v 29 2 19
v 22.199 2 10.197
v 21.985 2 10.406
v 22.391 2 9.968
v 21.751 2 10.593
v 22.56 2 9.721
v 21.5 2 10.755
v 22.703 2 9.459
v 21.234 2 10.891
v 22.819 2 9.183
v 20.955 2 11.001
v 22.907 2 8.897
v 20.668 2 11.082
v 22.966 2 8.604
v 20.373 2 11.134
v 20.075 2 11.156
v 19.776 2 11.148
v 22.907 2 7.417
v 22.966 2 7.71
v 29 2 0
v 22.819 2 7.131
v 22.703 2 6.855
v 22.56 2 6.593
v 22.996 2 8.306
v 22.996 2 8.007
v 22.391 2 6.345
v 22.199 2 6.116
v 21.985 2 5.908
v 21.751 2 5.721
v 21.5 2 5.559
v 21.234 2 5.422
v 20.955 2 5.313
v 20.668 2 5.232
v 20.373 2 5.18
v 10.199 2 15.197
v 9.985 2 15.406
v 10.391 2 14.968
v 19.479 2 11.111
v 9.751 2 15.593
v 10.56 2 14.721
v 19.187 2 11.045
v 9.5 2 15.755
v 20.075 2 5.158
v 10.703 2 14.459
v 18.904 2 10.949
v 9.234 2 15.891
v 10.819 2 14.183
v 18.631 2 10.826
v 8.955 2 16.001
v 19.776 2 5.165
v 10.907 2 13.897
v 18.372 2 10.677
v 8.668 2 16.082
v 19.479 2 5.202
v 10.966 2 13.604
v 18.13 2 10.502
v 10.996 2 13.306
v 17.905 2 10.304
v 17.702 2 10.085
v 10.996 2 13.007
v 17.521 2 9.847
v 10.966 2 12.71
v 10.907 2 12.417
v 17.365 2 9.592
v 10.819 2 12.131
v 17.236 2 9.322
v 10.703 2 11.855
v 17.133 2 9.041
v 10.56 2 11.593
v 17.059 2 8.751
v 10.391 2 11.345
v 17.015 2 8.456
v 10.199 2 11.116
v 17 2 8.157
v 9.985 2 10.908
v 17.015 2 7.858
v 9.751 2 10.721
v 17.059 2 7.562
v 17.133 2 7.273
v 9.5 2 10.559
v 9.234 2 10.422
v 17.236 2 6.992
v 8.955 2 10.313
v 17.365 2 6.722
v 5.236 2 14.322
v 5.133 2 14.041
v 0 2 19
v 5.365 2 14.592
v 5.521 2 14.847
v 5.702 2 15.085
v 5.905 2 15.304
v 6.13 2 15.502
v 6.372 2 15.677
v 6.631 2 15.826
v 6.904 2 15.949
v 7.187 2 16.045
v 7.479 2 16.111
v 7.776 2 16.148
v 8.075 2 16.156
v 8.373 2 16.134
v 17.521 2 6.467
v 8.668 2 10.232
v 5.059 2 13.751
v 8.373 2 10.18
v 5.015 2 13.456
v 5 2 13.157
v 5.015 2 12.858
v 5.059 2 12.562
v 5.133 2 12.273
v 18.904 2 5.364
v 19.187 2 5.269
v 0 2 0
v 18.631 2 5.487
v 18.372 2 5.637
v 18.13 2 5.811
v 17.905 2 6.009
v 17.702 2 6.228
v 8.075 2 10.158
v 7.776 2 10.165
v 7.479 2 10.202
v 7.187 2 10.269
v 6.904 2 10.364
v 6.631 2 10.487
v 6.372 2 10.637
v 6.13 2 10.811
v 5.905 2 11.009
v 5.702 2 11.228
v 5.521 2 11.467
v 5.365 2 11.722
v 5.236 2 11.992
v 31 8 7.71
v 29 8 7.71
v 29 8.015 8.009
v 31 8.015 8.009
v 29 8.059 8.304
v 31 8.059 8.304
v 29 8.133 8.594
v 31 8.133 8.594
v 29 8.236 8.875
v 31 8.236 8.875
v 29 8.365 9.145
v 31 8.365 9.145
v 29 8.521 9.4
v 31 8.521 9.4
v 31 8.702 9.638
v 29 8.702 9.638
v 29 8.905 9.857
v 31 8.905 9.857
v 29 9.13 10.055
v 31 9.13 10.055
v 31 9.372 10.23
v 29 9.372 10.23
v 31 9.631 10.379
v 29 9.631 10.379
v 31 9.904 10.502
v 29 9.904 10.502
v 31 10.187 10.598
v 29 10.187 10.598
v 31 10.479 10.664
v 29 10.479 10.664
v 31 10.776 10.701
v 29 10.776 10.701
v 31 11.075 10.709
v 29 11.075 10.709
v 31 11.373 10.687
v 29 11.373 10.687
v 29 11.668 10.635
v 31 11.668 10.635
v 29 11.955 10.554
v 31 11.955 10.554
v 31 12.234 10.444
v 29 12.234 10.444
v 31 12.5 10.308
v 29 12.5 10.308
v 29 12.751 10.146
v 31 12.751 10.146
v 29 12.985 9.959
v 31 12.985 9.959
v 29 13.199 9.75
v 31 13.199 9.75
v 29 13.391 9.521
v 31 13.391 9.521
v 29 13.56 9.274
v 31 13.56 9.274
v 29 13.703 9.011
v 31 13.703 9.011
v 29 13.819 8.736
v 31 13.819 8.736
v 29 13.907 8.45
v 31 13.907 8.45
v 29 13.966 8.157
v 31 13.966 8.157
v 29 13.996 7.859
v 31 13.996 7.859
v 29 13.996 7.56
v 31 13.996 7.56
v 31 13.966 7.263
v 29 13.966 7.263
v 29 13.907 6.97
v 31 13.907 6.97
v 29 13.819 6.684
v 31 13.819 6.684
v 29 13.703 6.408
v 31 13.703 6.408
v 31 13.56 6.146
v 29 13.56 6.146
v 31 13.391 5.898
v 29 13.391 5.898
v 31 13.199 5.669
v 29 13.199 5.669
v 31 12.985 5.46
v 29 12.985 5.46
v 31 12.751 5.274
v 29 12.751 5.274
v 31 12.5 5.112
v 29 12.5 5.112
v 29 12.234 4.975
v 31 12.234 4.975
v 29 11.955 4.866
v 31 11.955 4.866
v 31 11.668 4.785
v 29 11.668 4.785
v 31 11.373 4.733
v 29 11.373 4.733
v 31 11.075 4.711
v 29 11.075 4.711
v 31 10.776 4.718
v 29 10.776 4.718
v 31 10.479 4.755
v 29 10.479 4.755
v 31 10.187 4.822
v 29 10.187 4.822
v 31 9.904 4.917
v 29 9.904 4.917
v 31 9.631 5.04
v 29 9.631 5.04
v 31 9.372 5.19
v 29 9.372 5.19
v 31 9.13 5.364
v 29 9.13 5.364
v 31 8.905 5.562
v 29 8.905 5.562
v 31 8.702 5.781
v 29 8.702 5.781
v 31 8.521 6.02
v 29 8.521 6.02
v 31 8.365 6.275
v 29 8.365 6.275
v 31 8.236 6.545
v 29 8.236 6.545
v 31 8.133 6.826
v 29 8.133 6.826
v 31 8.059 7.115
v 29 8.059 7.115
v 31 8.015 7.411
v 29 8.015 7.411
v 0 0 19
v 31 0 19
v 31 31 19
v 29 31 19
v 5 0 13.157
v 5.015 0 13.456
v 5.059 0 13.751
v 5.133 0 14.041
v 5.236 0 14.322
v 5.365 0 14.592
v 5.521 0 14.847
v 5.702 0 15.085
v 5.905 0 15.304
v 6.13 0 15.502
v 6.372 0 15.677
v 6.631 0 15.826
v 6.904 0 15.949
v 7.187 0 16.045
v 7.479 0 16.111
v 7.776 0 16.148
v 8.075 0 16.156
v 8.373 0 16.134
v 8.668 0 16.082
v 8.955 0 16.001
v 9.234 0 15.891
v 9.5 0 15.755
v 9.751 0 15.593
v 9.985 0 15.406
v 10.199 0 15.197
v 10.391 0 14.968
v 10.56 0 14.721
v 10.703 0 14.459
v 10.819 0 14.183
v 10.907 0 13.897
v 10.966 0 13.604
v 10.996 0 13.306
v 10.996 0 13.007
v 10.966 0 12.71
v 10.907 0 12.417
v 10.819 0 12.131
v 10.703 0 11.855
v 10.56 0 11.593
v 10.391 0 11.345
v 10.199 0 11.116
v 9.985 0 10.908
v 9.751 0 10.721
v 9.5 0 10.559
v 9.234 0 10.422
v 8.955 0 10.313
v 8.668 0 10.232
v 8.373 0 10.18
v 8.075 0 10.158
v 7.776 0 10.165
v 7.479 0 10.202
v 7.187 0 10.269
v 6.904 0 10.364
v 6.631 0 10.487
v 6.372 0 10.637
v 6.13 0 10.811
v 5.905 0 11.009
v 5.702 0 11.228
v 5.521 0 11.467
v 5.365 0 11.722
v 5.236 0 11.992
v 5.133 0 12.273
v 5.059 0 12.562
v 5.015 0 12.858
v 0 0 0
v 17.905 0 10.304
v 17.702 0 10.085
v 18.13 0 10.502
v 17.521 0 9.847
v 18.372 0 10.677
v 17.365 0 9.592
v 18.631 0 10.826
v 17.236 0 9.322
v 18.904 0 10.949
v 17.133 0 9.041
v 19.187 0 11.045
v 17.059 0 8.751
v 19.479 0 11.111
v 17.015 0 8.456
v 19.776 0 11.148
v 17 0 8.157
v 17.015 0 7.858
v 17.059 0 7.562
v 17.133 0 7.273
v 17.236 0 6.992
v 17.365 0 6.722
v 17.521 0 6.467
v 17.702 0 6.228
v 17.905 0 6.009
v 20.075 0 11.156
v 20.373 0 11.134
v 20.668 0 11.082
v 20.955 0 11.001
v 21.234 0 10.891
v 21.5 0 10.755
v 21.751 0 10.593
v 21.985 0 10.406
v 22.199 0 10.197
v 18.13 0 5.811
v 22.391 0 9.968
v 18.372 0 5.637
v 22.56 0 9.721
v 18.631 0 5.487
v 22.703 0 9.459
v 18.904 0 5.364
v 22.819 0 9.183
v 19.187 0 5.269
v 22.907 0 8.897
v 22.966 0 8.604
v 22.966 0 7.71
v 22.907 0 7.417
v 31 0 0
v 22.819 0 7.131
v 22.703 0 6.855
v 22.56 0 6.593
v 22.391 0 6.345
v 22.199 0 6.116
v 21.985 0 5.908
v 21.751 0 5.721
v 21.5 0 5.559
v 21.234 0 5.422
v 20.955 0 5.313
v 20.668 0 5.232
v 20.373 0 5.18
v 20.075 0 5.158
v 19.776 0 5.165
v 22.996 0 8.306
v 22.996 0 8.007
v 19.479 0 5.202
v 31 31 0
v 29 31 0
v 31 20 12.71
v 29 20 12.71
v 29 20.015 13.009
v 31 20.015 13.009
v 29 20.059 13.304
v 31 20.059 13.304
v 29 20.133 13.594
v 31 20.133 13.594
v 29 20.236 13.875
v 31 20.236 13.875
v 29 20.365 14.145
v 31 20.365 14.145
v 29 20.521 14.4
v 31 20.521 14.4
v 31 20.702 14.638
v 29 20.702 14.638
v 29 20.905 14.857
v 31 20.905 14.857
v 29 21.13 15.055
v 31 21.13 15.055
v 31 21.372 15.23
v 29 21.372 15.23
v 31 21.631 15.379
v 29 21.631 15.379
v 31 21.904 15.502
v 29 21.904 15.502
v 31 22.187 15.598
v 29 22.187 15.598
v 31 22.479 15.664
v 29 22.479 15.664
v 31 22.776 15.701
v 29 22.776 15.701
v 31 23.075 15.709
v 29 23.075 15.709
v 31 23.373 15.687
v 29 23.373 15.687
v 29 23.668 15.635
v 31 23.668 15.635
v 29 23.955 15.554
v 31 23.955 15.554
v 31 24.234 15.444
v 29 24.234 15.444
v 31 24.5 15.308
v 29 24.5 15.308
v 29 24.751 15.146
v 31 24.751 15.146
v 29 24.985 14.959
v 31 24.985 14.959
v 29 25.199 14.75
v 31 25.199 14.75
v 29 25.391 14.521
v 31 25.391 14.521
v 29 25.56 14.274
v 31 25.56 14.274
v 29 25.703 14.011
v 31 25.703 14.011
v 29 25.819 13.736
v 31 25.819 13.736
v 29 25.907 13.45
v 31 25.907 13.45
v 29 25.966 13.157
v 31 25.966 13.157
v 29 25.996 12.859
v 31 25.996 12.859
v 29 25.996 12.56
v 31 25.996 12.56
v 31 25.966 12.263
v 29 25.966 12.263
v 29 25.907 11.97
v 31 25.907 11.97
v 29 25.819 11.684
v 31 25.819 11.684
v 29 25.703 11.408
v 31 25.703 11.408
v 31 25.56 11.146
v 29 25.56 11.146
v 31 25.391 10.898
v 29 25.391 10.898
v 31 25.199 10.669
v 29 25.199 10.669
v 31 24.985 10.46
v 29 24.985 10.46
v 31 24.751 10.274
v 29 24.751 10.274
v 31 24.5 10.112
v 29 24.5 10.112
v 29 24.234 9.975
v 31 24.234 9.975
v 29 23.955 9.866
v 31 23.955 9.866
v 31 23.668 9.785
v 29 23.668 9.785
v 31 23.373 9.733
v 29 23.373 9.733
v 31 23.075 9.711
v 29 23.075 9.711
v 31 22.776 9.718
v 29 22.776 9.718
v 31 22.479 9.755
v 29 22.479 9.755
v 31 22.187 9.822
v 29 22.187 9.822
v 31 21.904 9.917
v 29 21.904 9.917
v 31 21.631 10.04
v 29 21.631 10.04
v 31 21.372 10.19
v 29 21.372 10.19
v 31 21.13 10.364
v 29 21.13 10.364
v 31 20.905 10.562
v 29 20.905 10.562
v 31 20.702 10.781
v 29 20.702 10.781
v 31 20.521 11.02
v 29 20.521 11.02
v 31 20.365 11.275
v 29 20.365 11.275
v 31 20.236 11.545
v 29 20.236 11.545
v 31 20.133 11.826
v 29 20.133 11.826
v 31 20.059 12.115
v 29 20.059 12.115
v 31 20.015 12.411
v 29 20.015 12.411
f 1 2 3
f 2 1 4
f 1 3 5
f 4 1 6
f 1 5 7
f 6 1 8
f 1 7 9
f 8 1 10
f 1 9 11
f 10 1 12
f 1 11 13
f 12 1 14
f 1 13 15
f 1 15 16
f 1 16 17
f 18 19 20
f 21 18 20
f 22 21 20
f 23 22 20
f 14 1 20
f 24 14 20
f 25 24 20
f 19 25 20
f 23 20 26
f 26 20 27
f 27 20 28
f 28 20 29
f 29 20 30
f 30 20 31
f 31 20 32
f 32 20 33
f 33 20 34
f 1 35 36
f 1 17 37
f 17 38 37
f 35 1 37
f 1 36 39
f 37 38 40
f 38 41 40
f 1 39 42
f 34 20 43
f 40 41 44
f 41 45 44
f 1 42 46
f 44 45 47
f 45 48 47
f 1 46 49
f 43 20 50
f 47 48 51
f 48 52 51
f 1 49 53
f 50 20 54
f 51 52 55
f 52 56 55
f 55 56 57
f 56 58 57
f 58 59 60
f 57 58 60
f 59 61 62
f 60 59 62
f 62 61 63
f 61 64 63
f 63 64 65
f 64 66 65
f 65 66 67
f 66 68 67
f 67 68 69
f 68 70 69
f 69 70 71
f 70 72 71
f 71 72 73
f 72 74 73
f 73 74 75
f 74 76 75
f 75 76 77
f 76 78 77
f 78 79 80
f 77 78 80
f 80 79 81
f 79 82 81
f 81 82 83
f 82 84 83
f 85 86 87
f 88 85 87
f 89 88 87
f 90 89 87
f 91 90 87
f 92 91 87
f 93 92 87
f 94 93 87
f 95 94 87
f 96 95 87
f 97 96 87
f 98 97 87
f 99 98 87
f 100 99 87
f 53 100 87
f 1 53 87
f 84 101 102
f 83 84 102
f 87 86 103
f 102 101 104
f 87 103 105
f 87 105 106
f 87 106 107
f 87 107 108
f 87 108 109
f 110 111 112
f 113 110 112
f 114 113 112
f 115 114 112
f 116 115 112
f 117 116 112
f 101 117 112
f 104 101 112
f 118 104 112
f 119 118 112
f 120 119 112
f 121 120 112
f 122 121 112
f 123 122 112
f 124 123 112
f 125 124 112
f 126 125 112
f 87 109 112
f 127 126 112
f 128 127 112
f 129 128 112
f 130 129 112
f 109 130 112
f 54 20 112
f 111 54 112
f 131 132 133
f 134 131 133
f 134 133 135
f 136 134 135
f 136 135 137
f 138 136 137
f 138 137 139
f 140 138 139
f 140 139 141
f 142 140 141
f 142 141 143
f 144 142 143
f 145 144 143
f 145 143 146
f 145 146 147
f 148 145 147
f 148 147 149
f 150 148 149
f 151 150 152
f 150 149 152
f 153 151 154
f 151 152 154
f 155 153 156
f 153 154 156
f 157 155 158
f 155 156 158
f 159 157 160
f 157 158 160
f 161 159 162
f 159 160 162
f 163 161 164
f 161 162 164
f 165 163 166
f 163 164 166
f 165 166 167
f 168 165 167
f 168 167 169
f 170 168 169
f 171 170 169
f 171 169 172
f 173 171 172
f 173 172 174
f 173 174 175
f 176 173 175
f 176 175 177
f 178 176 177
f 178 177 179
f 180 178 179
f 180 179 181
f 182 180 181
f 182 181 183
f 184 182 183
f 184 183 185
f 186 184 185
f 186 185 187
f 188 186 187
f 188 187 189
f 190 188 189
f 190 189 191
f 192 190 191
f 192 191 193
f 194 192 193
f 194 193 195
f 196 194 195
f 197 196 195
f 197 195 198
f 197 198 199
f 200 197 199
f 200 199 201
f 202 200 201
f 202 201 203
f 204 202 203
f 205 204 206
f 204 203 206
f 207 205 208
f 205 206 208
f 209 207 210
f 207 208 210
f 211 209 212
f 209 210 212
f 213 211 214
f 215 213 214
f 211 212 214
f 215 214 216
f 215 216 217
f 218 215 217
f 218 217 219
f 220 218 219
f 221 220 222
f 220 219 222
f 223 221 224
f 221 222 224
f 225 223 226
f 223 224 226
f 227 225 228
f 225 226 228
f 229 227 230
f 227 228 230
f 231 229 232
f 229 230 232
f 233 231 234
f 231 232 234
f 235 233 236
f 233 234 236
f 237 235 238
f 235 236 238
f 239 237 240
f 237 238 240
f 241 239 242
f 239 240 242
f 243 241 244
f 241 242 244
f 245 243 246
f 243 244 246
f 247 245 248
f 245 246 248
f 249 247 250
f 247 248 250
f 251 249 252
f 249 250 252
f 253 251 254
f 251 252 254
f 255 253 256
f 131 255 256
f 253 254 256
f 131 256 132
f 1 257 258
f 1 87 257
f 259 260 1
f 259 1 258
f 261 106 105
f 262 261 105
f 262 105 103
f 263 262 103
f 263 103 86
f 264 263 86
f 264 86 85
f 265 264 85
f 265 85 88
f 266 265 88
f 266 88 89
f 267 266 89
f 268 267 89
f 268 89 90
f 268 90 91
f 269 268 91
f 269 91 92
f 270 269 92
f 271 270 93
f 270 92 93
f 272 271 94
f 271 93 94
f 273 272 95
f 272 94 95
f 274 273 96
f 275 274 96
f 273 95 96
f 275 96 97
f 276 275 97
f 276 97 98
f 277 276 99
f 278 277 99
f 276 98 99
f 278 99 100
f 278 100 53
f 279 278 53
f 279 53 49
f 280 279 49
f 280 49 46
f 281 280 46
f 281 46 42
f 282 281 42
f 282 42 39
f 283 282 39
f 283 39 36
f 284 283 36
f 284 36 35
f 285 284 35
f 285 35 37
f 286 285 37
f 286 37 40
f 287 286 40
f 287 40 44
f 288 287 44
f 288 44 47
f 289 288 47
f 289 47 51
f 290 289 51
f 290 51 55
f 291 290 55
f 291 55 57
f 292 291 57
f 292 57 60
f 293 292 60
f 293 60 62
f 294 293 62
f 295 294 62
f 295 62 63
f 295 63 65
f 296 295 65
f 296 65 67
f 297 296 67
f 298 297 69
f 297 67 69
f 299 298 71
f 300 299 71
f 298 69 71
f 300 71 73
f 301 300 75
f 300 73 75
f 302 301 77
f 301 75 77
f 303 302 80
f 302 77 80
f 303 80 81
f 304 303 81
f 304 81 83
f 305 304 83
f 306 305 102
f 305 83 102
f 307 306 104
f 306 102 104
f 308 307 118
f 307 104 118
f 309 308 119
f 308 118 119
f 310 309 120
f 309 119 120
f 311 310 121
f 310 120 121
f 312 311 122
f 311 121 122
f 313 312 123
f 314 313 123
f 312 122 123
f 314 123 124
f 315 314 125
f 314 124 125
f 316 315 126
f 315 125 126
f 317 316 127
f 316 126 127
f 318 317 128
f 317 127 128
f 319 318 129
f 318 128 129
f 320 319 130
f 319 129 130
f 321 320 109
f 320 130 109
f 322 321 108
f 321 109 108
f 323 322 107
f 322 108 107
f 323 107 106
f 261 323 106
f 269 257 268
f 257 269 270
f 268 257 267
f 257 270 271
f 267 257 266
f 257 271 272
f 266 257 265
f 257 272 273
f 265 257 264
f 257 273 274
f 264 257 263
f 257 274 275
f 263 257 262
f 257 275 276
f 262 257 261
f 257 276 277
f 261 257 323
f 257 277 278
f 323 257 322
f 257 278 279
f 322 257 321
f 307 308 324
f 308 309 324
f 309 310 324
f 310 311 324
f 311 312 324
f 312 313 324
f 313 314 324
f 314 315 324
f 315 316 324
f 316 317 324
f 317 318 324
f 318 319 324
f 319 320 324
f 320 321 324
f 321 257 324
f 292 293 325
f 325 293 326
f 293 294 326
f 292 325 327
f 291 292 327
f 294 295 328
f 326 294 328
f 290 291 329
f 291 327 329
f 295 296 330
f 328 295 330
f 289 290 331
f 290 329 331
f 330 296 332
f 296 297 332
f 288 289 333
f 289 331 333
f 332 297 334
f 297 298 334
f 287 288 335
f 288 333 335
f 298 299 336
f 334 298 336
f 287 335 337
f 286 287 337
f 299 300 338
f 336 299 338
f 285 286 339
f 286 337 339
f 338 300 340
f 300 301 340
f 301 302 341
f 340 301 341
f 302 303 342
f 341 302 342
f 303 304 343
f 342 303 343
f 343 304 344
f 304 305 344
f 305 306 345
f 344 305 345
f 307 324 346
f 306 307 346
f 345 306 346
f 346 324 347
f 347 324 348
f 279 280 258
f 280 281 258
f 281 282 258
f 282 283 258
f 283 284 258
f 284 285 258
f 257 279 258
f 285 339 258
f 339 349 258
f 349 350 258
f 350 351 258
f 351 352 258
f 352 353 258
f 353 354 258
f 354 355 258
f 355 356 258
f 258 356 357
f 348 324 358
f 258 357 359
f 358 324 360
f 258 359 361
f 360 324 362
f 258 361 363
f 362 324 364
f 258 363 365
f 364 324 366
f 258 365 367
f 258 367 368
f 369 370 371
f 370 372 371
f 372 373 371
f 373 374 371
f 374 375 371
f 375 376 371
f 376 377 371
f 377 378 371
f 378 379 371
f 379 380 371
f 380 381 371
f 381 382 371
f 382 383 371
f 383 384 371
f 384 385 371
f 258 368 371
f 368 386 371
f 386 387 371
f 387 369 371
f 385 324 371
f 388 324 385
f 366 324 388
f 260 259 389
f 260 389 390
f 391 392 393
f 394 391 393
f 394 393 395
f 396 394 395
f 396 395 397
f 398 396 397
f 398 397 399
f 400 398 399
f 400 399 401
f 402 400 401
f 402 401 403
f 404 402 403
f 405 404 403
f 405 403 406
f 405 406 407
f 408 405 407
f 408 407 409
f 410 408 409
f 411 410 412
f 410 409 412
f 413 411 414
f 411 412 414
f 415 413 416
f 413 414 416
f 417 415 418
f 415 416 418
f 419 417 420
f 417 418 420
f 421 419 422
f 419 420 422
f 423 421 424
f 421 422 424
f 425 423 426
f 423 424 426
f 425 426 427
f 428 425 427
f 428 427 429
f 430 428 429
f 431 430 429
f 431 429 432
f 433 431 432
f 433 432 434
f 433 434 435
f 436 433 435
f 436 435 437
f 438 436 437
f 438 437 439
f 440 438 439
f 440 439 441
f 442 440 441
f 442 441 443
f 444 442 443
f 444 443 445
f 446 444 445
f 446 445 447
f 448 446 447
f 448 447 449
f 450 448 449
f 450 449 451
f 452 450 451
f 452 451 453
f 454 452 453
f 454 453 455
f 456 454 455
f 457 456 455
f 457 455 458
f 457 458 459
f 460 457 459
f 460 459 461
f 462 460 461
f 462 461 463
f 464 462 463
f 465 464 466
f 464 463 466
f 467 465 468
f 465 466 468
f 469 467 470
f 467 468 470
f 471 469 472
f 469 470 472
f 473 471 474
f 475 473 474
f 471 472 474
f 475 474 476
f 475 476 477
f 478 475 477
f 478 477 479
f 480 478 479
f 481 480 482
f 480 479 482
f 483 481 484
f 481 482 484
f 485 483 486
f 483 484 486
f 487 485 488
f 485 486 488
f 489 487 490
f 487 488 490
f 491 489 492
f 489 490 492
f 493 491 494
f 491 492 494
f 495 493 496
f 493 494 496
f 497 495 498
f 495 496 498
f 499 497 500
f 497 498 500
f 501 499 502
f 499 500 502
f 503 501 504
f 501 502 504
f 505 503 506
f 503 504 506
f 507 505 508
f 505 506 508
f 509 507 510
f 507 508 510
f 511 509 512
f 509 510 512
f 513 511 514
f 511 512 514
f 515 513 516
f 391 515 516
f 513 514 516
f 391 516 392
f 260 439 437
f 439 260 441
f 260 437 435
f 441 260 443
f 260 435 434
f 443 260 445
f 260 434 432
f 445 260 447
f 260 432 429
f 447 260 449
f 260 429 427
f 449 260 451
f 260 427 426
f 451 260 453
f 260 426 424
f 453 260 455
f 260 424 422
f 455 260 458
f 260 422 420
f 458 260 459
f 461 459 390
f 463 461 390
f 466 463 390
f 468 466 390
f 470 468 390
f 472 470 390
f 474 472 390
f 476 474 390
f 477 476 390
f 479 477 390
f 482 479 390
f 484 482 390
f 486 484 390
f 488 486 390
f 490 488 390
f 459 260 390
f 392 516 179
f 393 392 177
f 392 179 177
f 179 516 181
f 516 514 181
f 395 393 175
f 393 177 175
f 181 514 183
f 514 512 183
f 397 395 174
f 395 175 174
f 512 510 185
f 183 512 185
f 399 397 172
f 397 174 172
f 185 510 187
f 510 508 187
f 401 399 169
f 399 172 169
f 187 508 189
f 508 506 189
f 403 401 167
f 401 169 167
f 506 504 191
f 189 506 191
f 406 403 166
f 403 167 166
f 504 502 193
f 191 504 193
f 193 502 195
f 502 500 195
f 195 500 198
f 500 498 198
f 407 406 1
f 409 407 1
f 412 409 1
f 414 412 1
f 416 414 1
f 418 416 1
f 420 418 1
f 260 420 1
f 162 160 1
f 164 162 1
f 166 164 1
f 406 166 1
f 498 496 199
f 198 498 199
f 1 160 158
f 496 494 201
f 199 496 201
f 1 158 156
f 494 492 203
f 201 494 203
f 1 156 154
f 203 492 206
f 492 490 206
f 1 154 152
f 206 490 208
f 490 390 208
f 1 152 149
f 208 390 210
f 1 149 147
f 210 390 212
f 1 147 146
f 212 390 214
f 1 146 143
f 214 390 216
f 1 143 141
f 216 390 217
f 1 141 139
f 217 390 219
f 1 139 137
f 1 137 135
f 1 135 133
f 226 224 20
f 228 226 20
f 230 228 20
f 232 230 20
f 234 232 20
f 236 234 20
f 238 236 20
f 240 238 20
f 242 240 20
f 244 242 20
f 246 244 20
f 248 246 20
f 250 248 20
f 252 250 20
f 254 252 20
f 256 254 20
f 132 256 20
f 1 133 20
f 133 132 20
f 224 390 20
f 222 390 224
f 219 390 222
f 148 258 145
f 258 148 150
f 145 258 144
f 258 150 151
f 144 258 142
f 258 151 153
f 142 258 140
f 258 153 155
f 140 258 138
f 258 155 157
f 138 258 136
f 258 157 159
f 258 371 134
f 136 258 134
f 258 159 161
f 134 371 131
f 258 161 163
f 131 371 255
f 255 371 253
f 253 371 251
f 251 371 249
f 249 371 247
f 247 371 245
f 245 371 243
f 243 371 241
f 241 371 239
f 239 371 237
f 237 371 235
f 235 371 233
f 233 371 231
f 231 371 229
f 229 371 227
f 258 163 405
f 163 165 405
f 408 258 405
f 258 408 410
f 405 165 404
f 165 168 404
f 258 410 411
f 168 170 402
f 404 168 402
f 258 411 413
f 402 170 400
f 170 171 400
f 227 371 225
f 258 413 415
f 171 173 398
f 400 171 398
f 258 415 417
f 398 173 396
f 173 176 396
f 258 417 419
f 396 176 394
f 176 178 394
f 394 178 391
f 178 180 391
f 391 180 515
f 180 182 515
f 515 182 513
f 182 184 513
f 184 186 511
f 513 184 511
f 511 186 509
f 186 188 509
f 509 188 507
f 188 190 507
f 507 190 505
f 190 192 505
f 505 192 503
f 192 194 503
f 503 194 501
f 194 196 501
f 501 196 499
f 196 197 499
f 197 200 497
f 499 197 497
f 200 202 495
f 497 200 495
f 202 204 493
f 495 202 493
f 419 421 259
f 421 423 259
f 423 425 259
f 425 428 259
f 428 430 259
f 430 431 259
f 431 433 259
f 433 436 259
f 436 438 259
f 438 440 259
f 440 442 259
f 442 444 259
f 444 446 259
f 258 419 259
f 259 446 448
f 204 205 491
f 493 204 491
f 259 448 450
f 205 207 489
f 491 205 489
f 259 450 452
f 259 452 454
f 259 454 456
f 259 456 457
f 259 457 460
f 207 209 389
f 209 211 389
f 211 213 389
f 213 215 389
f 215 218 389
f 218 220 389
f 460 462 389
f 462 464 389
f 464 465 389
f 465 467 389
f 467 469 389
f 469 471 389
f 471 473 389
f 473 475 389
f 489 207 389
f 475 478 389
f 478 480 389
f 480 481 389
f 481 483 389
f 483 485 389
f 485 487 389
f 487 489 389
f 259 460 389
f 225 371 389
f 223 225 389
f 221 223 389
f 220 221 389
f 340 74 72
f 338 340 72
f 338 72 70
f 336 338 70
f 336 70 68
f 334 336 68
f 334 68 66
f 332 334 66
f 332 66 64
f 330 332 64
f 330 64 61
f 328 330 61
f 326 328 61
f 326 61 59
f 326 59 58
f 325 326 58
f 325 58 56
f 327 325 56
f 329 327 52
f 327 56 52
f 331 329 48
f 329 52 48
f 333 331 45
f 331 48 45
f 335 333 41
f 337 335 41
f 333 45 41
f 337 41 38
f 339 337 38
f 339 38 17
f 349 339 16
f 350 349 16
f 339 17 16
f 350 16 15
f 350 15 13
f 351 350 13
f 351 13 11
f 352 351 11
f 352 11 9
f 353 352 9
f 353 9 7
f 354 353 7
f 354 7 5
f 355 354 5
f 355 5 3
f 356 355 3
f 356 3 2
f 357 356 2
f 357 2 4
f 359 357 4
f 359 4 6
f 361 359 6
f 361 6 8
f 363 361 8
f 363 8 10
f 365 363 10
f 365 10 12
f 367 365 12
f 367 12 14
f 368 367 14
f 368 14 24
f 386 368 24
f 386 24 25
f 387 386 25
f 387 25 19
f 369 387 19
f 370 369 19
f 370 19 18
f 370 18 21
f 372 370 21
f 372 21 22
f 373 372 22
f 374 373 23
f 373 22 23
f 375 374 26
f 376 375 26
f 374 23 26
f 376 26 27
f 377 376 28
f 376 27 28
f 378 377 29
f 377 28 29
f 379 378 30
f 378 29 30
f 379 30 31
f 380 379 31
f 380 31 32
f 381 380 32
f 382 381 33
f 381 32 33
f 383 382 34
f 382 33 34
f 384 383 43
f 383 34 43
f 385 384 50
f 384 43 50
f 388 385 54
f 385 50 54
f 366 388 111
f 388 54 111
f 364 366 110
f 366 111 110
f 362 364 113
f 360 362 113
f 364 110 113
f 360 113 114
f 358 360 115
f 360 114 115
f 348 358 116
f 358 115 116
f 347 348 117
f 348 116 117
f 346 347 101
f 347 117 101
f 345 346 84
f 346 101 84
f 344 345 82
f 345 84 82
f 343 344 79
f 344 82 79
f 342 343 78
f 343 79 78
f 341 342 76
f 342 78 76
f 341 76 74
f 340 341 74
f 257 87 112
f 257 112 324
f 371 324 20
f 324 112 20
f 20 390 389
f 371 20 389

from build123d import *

# Parameters (mm, degrees)
EXTRUDE_1_DEPTH     = 19
SKETCH_2_R          = 3
CUT_EXTRUDE_1_DEPTH = 19
SKETCH_3_R          = 3
CUT_EXTRUDE_2_DEPTH = 19


with BuildPart() as part:
    # 草图1 → 凸台-拉伸1 (new body)
    with BuildSketch(Plane.XY):
        Polygon((0, 0), (31, 0), (31, 31), (29, 31), (29, 2), (0, 2), align=None)
    extrude(amount=EXTRUDE_1_DEPTH)

    # 草图2 → 切除-拉伸1 (cut)
    with BuildSketch(Plane.ZY.offset(-29)):
        with Locations(Location((7.709838353, 11, 0), (0, 0, 270))):
            Circle(SKETCH_2_R)
        with Locations(Location((12.709838353, 23, 0), (0, 0, 270))):
            Circle(SKETCH_2_R)
    extrude(amount=-CUT_EXTRUDE_1_DEPTH, mode=Mode.SUBTRACT)

    # 草图3 → 切除-拉伸2 (cut)
    with BuildSketch(Plane(origin=(0, 2, 0), x_dir=(1, 0, 0), z_dir=(0, 1, 0))):
        with Locations(Location((20, -8.156857101, 0), (0, 0, 180))):
            Circle(SKETCH_3_R)
        with Locations(Location((8, -13.156857101, 0), (0, 0, 180))):
            Circle(SKETCH_3_R)
    extrude(amount=-CUT_EXTRUDE_2_DEPTH, mode=Mode.SUBTRACT)


solid = part.part
